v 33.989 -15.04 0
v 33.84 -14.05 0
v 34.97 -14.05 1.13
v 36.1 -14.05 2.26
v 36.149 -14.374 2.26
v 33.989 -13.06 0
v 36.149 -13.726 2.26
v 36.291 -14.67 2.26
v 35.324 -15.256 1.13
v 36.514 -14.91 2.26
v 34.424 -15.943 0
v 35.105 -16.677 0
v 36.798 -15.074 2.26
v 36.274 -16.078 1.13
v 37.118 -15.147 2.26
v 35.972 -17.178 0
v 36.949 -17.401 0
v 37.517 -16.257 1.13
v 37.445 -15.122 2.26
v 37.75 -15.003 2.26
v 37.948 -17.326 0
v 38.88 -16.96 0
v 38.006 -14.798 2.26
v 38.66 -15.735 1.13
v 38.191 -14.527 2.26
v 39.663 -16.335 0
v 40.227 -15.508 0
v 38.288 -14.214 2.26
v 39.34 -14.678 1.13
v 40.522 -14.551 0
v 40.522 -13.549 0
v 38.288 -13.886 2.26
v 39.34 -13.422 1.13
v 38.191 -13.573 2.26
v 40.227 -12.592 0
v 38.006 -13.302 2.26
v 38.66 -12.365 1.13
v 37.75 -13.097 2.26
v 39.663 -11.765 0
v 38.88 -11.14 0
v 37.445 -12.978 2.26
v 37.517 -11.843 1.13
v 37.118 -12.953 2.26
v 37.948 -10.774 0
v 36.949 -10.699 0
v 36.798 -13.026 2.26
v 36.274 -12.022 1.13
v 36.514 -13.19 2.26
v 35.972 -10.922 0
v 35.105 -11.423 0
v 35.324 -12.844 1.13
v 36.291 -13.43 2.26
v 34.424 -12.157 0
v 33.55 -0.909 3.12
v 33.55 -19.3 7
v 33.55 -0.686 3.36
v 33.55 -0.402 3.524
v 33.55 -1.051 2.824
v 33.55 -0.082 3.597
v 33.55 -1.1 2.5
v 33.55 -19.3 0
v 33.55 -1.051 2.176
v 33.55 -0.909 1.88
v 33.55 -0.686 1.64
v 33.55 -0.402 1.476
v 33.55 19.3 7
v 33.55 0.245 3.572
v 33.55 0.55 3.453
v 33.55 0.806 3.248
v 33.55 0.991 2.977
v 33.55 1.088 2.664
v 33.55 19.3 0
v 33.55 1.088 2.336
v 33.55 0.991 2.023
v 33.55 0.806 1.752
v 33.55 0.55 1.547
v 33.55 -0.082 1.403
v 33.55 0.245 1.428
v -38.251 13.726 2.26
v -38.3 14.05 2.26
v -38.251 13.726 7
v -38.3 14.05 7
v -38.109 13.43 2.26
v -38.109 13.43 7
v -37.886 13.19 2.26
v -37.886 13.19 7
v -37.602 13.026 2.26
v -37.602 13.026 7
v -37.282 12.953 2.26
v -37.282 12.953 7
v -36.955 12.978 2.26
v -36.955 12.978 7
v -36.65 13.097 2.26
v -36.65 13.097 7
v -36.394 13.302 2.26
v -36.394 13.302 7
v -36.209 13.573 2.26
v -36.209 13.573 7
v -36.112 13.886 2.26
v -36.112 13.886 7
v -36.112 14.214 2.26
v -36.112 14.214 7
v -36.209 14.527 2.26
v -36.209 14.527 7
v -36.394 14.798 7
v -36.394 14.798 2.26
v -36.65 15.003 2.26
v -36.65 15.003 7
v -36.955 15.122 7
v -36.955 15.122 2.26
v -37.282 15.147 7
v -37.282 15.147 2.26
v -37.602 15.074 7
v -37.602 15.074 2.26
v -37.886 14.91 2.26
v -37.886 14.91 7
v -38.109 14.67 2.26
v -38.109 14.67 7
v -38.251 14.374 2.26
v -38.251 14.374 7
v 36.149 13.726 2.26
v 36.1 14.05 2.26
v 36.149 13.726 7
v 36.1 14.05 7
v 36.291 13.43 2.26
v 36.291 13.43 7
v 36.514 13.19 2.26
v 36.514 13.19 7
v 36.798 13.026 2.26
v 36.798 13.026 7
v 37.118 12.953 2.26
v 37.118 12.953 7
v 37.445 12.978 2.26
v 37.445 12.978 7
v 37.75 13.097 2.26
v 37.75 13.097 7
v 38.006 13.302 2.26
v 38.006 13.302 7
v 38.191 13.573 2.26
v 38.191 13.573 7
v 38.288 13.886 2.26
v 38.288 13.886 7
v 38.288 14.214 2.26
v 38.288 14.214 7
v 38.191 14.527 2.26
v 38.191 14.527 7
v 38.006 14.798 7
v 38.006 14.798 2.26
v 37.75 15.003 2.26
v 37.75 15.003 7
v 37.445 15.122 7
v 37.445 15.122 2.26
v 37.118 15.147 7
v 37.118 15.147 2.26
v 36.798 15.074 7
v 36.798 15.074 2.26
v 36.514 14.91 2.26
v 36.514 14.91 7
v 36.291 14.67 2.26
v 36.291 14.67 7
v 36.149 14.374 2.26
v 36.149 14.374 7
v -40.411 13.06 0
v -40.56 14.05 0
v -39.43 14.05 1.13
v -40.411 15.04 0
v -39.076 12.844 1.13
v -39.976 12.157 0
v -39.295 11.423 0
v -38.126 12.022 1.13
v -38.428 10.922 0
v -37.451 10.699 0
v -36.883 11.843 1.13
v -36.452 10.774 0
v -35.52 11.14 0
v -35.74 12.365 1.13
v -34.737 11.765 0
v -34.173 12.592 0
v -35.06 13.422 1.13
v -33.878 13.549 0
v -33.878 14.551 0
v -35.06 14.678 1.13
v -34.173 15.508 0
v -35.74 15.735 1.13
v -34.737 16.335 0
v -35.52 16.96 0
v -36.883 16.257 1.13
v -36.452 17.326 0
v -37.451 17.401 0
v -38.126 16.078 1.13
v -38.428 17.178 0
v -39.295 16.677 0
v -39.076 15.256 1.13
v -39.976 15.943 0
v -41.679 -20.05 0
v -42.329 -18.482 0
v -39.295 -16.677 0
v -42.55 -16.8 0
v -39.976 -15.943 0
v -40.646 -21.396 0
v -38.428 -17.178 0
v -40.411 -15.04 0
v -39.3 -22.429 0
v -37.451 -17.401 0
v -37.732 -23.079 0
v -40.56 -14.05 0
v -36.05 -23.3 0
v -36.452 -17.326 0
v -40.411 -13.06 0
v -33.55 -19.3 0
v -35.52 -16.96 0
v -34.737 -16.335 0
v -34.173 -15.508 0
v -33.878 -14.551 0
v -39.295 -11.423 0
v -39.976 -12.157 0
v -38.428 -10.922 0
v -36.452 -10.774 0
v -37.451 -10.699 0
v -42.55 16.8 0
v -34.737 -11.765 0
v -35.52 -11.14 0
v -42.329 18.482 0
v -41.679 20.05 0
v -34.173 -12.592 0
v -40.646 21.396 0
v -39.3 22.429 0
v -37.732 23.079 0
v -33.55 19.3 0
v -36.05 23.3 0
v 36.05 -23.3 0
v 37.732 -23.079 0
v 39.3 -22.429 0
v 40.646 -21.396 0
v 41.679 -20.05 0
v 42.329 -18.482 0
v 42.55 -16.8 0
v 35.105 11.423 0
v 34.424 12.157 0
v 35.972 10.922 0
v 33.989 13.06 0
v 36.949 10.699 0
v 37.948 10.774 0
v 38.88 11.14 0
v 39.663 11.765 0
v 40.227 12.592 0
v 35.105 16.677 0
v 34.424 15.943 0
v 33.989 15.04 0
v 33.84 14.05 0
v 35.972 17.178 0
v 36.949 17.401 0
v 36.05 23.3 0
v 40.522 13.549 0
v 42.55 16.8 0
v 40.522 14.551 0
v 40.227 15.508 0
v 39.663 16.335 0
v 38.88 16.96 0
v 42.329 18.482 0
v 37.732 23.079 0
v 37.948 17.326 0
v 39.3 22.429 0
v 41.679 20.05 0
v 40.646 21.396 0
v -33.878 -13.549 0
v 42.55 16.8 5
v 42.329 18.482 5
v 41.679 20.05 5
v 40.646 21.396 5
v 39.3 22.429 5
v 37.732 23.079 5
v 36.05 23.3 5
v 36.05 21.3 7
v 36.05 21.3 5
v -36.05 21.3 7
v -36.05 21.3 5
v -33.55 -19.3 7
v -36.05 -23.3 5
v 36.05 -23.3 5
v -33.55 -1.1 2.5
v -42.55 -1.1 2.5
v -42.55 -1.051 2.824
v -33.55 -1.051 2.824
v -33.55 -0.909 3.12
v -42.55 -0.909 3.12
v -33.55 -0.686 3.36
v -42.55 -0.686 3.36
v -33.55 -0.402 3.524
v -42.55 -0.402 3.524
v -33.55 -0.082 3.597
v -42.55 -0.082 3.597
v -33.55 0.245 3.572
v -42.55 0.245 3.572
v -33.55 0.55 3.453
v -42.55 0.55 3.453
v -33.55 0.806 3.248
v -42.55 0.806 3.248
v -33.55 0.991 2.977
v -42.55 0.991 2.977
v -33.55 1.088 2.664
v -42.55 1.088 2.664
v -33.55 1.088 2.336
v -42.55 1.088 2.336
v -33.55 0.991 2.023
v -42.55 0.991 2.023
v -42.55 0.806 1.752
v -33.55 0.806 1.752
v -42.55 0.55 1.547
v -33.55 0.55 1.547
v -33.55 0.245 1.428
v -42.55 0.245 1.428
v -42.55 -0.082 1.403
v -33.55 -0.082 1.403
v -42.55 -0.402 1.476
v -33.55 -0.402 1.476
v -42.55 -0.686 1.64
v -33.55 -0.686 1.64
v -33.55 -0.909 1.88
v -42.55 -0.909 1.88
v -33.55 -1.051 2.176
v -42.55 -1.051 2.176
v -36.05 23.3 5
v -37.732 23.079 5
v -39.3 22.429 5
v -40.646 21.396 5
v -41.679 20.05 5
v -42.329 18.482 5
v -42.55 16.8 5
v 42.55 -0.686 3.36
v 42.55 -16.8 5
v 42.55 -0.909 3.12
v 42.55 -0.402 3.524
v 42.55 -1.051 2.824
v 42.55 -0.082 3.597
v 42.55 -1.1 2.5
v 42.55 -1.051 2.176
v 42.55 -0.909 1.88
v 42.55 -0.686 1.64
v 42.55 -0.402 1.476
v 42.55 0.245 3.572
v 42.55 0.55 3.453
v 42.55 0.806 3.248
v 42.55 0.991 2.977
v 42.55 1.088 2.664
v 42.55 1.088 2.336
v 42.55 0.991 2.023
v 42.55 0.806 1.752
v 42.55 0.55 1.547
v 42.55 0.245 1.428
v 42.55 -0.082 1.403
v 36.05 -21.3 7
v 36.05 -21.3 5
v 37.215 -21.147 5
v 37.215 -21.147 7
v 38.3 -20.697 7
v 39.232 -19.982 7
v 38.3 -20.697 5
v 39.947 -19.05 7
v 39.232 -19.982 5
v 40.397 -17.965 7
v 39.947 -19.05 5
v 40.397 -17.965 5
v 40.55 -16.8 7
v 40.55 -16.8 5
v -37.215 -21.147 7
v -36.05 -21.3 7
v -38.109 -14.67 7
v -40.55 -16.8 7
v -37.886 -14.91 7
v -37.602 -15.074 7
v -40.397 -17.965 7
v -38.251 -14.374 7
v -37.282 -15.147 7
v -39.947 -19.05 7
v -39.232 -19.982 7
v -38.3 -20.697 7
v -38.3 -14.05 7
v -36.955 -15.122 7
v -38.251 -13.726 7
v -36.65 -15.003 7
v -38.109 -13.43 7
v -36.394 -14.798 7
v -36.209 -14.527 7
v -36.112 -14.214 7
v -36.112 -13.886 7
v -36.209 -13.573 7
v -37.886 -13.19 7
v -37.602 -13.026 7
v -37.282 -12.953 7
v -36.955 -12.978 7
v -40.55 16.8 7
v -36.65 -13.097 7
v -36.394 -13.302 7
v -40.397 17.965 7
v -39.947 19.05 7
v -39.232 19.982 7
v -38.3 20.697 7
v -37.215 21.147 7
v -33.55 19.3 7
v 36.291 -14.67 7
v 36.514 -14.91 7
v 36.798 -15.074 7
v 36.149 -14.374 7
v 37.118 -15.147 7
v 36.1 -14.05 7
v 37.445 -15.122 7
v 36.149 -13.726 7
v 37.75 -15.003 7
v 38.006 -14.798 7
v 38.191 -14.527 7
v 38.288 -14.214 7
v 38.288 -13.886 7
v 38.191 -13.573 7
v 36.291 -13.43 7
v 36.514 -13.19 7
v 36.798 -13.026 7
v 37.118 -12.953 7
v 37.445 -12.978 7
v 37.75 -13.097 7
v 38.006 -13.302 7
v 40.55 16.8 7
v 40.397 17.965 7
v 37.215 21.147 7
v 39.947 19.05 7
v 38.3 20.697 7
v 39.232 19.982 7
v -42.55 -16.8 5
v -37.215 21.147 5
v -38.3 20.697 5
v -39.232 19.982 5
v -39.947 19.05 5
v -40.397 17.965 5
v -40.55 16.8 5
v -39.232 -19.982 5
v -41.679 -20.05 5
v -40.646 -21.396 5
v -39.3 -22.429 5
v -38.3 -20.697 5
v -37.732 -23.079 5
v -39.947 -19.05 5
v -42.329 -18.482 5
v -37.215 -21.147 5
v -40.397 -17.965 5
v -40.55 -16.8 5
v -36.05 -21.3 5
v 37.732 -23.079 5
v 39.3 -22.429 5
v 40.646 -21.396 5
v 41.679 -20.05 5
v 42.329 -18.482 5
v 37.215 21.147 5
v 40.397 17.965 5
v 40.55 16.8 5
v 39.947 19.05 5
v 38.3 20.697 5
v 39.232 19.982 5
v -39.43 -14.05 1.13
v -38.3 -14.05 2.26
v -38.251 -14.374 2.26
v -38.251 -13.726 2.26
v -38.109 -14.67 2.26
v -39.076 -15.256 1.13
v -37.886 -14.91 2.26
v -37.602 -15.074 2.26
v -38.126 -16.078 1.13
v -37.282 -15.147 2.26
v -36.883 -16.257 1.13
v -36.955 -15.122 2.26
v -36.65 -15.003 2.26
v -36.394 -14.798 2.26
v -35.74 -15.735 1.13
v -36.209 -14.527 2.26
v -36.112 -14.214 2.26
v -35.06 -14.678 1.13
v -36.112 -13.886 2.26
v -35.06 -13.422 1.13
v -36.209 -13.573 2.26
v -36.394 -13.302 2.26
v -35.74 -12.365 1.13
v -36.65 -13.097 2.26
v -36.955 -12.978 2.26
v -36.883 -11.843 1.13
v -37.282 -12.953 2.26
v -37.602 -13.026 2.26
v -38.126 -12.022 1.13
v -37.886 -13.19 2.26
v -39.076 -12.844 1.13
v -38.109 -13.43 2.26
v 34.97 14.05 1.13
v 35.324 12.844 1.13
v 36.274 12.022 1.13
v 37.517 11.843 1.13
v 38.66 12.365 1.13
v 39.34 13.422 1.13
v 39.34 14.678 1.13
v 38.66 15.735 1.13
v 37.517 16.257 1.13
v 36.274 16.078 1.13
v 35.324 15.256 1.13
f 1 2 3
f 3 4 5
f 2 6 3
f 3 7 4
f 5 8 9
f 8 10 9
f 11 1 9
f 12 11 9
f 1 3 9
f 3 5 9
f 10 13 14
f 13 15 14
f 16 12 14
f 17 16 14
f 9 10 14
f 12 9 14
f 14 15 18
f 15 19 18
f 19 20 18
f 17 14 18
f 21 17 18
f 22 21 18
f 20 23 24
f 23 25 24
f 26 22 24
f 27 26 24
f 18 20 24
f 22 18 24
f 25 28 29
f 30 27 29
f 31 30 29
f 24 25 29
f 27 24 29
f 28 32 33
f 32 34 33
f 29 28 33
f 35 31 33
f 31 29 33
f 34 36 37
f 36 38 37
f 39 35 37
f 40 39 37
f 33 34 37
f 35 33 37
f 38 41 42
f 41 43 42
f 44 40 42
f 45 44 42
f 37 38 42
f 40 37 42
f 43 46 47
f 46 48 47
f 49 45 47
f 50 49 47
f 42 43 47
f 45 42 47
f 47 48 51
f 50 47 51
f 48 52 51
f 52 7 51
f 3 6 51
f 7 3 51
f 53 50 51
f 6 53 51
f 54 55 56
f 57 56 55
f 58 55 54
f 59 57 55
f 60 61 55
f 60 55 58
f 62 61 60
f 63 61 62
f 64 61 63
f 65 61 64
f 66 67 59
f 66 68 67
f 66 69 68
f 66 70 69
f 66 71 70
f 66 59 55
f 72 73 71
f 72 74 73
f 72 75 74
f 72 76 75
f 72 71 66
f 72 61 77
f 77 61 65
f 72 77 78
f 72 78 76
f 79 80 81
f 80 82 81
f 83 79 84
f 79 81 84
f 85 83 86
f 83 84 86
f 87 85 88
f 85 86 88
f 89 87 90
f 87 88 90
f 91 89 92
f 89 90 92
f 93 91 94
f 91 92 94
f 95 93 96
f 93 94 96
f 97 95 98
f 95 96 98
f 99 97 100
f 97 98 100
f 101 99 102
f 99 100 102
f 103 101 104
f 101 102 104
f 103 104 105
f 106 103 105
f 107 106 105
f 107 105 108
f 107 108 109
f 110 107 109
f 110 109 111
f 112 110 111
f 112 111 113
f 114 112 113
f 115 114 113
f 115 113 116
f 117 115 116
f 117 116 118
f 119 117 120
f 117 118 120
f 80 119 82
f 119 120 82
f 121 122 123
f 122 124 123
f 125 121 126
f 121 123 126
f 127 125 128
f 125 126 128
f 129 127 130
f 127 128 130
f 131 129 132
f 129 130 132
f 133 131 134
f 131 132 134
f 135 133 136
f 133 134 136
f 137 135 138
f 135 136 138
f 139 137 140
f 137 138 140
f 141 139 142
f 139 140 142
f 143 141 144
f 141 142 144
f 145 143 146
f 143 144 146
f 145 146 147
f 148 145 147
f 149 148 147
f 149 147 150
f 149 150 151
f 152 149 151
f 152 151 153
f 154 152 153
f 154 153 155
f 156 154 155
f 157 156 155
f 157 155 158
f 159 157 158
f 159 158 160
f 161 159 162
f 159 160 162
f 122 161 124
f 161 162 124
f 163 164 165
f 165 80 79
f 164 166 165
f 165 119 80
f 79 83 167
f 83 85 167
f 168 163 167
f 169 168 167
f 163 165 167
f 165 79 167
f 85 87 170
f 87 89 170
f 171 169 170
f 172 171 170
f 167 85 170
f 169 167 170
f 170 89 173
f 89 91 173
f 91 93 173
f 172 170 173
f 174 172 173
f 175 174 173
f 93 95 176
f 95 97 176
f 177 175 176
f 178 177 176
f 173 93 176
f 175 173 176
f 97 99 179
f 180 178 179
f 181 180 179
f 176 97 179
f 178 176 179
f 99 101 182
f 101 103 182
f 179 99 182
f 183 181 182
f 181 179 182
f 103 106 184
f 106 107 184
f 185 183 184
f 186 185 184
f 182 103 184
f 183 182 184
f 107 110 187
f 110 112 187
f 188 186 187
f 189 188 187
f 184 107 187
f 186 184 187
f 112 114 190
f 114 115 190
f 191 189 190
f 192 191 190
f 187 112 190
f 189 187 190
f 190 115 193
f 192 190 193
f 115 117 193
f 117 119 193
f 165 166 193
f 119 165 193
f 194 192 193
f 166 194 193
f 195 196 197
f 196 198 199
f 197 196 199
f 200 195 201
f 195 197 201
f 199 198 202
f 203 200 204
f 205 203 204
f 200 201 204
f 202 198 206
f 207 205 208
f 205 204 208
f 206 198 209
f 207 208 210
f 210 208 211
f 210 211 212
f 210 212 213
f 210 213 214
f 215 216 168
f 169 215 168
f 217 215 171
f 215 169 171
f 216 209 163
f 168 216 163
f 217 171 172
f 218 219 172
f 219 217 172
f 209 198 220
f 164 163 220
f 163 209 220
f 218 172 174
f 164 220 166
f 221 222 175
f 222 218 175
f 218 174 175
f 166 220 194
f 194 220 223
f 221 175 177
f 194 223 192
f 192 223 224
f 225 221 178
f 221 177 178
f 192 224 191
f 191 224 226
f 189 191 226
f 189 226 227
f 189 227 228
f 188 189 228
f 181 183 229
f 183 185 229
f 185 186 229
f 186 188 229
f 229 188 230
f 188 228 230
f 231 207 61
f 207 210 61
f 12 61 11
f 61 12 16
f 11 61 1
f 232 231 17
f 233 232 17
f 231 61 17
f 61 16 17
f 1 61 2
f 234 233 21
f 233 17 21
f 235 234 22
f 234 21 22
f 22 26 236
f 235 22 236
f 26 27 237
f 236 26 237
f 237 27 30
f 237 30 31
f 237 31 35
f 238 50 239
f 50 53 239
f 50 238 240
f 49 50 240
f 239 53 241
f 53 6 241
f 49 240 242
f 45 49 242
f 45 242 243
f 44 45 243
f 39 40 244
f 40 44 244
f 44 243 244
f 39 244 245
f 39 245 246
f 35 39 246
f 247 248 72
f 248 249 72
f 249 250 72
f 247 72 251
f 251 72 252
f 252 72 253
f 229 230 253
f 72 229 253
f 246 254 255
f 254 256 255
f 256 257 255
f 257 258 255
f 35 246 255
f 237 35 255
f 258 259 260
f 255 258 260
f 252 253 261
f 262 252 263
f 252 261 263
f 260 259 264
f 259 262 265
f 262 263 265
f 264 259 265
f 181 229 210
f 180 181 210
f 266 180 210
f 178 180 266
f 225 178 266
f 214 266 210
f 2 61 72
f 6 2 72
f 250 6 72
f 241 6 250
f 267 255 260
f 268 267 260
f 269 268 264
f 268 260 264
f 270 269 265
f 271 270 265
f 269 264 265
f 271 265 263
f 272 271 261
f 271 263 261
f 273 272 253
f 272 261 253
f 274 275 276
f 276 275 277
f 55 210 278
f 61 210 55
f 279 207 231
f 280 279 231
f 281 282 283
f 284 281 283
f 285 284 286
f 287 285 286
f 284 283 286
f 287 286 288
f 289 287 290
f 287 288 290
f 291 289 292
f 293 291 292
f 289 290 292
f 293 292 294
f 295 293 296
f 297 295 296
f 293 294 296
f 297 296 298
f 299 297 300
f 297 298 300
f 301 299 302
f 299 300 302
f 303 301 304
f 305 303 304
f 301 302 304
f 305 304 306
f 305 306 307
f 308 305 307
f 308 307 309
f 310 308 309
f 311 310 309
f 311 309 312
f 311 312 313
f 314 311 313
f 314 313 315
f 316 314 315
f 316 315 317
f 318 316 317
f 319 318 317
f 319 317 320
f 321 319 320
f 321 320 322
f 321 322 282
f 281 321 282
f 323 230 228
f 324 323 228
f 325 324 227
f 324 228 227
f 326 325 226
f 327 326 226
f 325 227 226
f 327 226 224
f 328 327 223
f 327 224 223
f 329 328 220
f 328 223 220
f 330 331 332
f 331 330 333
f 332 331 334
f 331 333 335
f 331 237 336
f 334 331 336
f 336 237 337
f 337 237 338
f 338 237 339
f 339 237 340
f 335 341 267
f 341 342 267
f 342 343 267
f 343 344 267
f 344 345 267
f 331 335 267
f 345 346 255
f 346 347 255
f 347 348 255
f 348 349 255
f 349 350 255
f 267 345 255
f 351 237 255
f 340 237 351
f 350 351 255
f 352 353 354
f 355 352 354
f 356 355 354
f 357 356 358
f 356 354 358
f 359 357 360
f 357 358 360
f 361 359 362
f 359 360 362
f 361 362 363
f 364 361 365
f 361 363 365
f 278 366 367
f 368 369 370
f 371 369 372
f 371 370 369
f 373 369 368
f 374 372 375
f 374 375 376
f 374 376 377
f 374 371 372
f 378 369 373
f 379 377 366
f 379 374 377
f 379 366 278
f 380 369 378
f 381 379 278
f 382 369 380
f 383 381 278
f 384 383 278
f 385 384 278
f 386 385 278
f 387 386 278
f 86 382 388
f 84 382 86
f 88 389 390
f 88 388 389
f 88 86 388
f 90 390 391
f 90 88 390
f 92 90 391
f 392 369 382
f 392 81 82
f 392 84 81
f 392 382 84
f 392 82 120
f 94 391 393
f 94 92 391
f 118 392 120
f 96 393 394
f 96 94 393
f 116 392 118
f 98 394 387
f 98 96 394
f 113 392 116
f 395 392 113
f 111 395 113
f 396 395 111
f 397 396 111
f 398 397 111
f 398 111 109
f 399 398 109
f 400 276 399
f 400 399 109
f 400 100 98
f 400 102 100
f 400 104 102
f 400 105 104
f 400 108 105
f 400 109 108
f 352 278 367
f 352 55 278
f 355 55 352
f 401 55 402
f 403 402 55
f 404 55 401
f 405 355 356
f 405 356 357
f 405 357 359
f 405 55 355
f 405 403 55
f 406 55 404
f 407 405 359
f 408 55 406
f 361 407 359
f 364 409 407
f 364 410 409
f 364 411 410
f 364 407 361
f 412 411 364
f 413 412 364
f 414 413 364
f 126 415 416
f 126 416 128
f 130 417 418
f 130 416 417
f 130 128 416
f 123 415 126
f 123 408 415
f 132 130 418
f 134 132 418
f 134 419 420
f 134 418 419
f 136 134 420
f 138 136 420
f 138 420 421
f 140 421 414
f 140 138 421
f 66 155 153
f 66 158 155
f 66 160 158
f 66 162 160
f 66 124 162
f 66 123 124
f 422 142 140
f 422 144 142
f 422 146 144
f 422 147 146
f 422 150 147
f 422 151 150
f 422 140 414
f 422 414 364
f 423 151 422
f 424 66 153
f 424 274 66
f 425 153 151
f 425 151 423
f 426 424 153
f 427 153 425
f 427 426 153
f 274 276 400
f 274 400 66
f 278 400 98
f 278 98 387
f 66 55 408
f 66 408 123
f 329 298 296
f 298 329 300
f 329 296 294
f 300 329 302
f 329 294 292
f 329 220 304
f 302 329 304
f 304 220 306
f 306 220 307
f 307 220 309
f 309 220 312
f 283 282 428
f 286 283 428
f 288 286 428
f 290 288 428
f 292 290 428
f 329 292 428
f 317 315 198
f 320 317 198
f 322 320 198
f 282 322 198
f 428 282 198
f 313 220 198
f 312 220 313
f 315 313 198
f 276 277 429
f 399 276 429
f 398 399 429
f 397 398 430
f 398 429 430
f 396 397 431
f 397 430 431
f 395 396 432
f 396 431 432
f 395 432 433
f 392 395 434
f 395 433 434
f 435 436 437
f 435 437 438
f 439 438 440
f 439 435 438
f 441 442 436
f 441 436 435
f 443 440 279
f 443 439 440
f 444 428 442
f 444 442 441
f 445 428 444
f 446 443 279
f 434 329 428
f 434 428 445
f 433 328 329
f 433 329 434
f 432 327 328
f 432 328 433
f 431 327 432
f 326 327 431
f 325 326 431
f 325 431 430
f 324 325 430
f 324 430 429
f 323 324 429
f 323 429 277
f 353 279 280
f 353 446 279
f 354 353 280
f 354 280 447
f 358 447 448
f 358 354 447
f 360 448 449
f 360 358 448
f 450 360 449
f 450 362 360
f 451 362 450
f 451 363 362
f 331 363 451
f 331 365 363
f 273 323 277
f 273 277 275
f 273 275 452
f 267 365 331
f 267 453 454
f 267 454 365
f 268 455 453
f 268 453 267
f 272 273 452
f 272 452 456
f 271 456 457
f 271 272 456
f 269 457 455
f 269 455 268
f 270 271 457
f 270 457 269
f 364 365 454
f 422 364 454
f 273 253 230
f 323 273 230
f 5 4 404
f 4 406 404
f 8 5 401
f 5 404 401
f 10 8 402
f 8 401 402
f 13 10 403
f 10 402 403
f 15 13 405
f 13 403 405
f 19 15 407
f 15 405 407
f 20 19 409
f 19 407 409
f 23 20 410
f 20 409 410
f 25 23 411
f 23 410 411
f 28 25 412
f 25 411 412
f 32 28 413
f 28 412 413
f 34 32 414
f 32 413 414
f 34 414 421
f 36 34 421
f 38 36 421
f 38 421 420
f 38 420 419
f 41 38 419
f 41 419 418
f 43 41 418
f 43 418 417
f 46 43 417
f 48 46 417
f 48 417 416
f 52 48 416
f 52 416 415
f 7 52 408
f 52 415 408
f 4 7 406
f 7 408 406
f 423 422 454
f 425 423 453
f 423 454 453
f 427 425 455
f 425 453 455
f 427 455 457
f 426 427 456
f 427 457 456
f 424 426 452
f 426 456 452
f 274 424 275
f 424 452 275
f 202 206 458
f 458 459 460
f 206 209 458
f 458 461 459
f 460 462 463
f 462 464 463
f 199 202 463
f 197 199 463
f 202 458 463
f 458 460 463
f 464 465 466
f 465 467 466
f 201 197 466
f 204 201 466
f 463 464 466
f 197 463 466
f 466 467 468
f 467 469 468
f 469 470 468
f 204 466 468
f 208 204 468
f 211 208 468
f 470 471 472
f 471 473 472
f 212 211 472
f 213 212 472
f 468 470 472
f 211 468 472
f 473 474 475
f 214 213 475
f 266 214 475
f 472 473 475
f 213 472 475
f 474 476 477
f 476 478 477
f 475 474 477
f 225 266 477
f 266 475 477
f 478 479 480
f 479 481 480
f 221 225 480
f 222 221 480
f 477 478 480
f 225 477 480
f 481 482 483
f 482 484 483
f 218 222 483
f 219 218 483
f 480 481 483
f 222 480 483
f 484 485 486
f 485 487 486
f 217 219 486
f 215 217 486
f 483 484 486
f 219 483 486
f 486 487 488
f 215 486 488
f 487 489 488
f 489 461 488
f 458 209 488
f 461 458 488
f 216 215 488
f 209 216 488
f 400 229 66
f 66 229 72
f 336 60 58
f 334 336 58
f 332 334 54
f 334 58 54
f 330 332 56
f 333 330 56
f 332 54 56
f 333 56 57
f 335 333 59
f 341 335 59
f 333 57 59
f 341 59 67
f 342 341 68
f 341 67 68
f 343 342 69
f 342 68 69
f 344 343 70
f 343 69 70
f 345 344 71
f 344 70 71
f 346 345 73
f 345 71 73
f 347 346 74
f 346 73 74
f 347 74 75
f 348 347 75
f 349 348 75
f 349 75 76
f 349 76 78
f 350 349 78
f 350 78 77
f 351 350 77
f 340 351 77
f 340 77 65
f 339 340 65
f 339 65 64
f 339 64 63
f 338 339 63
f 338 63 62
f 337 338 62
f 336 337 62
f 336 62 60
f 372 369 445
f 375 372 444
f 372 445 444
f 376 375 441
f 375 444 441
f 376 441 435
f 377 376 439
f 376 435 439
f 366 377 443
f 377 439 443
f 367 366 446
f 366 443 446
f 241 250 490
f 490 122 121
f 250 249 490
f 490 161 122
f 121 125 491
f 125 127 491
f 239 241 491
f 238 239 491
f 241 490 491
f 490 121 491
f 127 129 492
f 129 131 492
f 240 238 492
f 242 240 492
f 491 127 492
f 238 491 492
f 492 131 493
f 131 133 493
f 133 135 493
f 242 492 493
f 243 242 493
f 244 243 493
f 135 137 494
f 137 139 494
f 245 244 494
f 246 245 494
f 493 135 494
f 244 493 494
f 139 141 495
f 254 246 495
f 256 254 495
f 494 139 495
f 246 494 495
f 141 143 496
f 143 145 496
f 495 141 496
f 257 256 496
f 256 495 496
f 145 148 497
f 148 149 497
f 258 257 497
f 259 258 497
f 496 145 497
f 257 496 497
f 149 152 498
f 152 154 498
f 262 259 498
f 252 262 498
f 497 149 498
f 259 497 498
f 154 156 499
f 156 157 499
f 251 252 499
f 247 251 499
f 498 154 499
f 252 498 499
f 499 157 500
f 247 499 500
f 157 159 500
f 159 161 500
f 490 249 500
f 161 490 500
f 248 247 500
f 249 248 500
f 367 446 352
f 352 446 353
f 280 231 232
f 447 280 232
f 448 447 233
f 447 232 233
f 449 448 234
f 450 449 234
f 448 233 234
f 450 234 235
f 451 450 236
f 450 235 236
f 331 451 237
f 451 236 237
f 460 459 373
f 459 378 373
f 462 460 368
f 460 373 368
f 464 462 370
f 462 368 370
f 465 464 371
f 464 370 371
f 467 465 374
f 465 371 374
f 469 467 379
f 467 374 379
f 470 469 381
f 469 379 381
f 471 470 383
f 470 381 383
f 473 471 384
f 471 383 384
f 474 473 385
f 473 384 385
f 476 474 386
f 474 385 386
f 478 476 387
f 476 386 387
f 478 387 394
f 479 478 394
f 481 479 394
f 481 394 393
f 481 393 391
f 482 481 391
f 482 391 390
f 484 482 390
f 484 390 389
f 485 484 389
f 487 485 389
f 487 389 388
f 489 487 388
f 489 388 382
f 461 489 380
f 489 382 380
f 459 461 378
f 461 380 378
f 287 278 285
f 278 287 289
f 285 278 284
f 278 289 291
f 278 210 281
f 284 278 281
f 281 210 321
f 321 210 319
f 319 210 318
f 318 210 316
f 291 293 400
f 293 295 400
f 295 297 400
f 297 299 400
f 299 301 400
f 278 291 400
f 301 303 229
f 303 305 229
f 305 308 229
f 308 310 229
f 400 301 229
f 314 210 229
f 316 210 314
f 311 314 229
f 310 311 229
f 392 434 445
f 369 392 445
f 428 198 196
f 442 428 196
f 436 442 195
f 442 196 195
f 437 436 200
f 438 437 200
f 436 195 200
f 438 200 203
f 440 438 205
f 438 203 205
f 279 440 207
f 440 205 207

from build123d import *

# Parameters (mm, degrees)
F0_W           = 67.1
F0_H           = 38.6
F1_DEPTH       = 7
F2_DEPTH       = 5
F3_D           = 2.2
F3_CSINK_D     = 6.72
F3_CSINK_ANGLE = 90
F5_D           = 2.2


with BuildPart() as f1:
    # F0 (on Top) → F1 (new body)
    with BuildSketch(Plane.XY):
        with BuildLine():
            ThreePointArc((40.55, 16.8), (39.231981, 19.981981), (36.05, 21.3))
            Line((36.05, 21.3), (-36.05, 21.3))
            ThreePointArc((-36.05, 21.3), (-39.231981, 19.981981), (-40.55, 16.8))
            Line((-40.55, 16.8), (-40.55, -16.8))
            ThreePointArc((-40.55, -16.8), (-39.231981, -19.981981), (-36.05, -21.3))
            Line((-36.05, -21.3), (36.05, -21.3))
            ThreePointArc((36.05, -21.3), (39.231981, -19.981981), (40.55, -16.8))
            Line((40.55, -16.8), (40.55, 16.8))
        make_face()
        Rectangle(F0_W, F0_H, mode=Mode.SUBTRACT)
    extrude(amount=F1_DEPTH)

    # F0 (on Top) → F2 (join)
    with BuildSketch(Plane.XY):
        with BuildLine():
            Line((42.55, -16.8), (42.55, 16.8))
            ThreePointArc((42.55, 16.8), (40.646194, 21.396194), (36.05, 23.3))
            Line((36.05, 23.3), (-36.05, 23.3))
            ThreePointArc((-36.05, 23.3), (-40.646194, 21.396194), (-42.55, 16.8))
            Line((-42.55, 16.8), (-42.55, -16.8))
            ThreePointArc((-42.55, -16.8), (-40.646194, -21.396194), (-36.05, -23.3))
            Line((-36.05, -23.3), (36.05, -23.3))
            ThreePointArc((36.05, -23.3), (40.646194, -21.396194), (42.55, -16.8))
        make_face()
        with BuildLine():
            Line((-36.05, 21.3), (36.05, 21.3))
            ThreePointArc((36.05, 21.3), (39.231981, 19.981981), (40.55, 16.8))
            Line((40.55, 16.8), (40.55, -16.8))
            ThreePointArc((40.55, -16.8), (39.231981, -19.981981), (36.05, -21.3))
            Line((36.05, -21.3), (-36.05, -21.3))
            ThreePointArc((-36.05, -21.3), (-39.231981, -19.981981), (-40.55, -16.8))
            Line((-40.55, -16.8), (-40.55, 16.8))
            ThreePointArc((-40.55, 16.8), (-39.231981, 19.981981), (-36.05, 21.3))
        make_face(mode=Mode.SUBTRACT)
    extrude(amount=F2_DEPTH)

    # F3 (through all)
    with Locations(Plane(origin=(0, 0, 0), x_dir=(1, 0, 0), z_dir=(0, 0, -1))):
        with Locations((37.2, 14.05), (37.2, -14.05), (-37.2, -14.05), (-37.2, 14.05)):
            CounterSinkHole(F3_D / 2, F3_CSINK_D / 2, counter_sink_angle=F3_CSINK_ANGLE)

    # F5 (through all)
    with Locations(Plane.YZ.offset(42.55)):
        with Locations((0, 2.5)):
            Hole(F5_D / 2)


solid = f1.part
